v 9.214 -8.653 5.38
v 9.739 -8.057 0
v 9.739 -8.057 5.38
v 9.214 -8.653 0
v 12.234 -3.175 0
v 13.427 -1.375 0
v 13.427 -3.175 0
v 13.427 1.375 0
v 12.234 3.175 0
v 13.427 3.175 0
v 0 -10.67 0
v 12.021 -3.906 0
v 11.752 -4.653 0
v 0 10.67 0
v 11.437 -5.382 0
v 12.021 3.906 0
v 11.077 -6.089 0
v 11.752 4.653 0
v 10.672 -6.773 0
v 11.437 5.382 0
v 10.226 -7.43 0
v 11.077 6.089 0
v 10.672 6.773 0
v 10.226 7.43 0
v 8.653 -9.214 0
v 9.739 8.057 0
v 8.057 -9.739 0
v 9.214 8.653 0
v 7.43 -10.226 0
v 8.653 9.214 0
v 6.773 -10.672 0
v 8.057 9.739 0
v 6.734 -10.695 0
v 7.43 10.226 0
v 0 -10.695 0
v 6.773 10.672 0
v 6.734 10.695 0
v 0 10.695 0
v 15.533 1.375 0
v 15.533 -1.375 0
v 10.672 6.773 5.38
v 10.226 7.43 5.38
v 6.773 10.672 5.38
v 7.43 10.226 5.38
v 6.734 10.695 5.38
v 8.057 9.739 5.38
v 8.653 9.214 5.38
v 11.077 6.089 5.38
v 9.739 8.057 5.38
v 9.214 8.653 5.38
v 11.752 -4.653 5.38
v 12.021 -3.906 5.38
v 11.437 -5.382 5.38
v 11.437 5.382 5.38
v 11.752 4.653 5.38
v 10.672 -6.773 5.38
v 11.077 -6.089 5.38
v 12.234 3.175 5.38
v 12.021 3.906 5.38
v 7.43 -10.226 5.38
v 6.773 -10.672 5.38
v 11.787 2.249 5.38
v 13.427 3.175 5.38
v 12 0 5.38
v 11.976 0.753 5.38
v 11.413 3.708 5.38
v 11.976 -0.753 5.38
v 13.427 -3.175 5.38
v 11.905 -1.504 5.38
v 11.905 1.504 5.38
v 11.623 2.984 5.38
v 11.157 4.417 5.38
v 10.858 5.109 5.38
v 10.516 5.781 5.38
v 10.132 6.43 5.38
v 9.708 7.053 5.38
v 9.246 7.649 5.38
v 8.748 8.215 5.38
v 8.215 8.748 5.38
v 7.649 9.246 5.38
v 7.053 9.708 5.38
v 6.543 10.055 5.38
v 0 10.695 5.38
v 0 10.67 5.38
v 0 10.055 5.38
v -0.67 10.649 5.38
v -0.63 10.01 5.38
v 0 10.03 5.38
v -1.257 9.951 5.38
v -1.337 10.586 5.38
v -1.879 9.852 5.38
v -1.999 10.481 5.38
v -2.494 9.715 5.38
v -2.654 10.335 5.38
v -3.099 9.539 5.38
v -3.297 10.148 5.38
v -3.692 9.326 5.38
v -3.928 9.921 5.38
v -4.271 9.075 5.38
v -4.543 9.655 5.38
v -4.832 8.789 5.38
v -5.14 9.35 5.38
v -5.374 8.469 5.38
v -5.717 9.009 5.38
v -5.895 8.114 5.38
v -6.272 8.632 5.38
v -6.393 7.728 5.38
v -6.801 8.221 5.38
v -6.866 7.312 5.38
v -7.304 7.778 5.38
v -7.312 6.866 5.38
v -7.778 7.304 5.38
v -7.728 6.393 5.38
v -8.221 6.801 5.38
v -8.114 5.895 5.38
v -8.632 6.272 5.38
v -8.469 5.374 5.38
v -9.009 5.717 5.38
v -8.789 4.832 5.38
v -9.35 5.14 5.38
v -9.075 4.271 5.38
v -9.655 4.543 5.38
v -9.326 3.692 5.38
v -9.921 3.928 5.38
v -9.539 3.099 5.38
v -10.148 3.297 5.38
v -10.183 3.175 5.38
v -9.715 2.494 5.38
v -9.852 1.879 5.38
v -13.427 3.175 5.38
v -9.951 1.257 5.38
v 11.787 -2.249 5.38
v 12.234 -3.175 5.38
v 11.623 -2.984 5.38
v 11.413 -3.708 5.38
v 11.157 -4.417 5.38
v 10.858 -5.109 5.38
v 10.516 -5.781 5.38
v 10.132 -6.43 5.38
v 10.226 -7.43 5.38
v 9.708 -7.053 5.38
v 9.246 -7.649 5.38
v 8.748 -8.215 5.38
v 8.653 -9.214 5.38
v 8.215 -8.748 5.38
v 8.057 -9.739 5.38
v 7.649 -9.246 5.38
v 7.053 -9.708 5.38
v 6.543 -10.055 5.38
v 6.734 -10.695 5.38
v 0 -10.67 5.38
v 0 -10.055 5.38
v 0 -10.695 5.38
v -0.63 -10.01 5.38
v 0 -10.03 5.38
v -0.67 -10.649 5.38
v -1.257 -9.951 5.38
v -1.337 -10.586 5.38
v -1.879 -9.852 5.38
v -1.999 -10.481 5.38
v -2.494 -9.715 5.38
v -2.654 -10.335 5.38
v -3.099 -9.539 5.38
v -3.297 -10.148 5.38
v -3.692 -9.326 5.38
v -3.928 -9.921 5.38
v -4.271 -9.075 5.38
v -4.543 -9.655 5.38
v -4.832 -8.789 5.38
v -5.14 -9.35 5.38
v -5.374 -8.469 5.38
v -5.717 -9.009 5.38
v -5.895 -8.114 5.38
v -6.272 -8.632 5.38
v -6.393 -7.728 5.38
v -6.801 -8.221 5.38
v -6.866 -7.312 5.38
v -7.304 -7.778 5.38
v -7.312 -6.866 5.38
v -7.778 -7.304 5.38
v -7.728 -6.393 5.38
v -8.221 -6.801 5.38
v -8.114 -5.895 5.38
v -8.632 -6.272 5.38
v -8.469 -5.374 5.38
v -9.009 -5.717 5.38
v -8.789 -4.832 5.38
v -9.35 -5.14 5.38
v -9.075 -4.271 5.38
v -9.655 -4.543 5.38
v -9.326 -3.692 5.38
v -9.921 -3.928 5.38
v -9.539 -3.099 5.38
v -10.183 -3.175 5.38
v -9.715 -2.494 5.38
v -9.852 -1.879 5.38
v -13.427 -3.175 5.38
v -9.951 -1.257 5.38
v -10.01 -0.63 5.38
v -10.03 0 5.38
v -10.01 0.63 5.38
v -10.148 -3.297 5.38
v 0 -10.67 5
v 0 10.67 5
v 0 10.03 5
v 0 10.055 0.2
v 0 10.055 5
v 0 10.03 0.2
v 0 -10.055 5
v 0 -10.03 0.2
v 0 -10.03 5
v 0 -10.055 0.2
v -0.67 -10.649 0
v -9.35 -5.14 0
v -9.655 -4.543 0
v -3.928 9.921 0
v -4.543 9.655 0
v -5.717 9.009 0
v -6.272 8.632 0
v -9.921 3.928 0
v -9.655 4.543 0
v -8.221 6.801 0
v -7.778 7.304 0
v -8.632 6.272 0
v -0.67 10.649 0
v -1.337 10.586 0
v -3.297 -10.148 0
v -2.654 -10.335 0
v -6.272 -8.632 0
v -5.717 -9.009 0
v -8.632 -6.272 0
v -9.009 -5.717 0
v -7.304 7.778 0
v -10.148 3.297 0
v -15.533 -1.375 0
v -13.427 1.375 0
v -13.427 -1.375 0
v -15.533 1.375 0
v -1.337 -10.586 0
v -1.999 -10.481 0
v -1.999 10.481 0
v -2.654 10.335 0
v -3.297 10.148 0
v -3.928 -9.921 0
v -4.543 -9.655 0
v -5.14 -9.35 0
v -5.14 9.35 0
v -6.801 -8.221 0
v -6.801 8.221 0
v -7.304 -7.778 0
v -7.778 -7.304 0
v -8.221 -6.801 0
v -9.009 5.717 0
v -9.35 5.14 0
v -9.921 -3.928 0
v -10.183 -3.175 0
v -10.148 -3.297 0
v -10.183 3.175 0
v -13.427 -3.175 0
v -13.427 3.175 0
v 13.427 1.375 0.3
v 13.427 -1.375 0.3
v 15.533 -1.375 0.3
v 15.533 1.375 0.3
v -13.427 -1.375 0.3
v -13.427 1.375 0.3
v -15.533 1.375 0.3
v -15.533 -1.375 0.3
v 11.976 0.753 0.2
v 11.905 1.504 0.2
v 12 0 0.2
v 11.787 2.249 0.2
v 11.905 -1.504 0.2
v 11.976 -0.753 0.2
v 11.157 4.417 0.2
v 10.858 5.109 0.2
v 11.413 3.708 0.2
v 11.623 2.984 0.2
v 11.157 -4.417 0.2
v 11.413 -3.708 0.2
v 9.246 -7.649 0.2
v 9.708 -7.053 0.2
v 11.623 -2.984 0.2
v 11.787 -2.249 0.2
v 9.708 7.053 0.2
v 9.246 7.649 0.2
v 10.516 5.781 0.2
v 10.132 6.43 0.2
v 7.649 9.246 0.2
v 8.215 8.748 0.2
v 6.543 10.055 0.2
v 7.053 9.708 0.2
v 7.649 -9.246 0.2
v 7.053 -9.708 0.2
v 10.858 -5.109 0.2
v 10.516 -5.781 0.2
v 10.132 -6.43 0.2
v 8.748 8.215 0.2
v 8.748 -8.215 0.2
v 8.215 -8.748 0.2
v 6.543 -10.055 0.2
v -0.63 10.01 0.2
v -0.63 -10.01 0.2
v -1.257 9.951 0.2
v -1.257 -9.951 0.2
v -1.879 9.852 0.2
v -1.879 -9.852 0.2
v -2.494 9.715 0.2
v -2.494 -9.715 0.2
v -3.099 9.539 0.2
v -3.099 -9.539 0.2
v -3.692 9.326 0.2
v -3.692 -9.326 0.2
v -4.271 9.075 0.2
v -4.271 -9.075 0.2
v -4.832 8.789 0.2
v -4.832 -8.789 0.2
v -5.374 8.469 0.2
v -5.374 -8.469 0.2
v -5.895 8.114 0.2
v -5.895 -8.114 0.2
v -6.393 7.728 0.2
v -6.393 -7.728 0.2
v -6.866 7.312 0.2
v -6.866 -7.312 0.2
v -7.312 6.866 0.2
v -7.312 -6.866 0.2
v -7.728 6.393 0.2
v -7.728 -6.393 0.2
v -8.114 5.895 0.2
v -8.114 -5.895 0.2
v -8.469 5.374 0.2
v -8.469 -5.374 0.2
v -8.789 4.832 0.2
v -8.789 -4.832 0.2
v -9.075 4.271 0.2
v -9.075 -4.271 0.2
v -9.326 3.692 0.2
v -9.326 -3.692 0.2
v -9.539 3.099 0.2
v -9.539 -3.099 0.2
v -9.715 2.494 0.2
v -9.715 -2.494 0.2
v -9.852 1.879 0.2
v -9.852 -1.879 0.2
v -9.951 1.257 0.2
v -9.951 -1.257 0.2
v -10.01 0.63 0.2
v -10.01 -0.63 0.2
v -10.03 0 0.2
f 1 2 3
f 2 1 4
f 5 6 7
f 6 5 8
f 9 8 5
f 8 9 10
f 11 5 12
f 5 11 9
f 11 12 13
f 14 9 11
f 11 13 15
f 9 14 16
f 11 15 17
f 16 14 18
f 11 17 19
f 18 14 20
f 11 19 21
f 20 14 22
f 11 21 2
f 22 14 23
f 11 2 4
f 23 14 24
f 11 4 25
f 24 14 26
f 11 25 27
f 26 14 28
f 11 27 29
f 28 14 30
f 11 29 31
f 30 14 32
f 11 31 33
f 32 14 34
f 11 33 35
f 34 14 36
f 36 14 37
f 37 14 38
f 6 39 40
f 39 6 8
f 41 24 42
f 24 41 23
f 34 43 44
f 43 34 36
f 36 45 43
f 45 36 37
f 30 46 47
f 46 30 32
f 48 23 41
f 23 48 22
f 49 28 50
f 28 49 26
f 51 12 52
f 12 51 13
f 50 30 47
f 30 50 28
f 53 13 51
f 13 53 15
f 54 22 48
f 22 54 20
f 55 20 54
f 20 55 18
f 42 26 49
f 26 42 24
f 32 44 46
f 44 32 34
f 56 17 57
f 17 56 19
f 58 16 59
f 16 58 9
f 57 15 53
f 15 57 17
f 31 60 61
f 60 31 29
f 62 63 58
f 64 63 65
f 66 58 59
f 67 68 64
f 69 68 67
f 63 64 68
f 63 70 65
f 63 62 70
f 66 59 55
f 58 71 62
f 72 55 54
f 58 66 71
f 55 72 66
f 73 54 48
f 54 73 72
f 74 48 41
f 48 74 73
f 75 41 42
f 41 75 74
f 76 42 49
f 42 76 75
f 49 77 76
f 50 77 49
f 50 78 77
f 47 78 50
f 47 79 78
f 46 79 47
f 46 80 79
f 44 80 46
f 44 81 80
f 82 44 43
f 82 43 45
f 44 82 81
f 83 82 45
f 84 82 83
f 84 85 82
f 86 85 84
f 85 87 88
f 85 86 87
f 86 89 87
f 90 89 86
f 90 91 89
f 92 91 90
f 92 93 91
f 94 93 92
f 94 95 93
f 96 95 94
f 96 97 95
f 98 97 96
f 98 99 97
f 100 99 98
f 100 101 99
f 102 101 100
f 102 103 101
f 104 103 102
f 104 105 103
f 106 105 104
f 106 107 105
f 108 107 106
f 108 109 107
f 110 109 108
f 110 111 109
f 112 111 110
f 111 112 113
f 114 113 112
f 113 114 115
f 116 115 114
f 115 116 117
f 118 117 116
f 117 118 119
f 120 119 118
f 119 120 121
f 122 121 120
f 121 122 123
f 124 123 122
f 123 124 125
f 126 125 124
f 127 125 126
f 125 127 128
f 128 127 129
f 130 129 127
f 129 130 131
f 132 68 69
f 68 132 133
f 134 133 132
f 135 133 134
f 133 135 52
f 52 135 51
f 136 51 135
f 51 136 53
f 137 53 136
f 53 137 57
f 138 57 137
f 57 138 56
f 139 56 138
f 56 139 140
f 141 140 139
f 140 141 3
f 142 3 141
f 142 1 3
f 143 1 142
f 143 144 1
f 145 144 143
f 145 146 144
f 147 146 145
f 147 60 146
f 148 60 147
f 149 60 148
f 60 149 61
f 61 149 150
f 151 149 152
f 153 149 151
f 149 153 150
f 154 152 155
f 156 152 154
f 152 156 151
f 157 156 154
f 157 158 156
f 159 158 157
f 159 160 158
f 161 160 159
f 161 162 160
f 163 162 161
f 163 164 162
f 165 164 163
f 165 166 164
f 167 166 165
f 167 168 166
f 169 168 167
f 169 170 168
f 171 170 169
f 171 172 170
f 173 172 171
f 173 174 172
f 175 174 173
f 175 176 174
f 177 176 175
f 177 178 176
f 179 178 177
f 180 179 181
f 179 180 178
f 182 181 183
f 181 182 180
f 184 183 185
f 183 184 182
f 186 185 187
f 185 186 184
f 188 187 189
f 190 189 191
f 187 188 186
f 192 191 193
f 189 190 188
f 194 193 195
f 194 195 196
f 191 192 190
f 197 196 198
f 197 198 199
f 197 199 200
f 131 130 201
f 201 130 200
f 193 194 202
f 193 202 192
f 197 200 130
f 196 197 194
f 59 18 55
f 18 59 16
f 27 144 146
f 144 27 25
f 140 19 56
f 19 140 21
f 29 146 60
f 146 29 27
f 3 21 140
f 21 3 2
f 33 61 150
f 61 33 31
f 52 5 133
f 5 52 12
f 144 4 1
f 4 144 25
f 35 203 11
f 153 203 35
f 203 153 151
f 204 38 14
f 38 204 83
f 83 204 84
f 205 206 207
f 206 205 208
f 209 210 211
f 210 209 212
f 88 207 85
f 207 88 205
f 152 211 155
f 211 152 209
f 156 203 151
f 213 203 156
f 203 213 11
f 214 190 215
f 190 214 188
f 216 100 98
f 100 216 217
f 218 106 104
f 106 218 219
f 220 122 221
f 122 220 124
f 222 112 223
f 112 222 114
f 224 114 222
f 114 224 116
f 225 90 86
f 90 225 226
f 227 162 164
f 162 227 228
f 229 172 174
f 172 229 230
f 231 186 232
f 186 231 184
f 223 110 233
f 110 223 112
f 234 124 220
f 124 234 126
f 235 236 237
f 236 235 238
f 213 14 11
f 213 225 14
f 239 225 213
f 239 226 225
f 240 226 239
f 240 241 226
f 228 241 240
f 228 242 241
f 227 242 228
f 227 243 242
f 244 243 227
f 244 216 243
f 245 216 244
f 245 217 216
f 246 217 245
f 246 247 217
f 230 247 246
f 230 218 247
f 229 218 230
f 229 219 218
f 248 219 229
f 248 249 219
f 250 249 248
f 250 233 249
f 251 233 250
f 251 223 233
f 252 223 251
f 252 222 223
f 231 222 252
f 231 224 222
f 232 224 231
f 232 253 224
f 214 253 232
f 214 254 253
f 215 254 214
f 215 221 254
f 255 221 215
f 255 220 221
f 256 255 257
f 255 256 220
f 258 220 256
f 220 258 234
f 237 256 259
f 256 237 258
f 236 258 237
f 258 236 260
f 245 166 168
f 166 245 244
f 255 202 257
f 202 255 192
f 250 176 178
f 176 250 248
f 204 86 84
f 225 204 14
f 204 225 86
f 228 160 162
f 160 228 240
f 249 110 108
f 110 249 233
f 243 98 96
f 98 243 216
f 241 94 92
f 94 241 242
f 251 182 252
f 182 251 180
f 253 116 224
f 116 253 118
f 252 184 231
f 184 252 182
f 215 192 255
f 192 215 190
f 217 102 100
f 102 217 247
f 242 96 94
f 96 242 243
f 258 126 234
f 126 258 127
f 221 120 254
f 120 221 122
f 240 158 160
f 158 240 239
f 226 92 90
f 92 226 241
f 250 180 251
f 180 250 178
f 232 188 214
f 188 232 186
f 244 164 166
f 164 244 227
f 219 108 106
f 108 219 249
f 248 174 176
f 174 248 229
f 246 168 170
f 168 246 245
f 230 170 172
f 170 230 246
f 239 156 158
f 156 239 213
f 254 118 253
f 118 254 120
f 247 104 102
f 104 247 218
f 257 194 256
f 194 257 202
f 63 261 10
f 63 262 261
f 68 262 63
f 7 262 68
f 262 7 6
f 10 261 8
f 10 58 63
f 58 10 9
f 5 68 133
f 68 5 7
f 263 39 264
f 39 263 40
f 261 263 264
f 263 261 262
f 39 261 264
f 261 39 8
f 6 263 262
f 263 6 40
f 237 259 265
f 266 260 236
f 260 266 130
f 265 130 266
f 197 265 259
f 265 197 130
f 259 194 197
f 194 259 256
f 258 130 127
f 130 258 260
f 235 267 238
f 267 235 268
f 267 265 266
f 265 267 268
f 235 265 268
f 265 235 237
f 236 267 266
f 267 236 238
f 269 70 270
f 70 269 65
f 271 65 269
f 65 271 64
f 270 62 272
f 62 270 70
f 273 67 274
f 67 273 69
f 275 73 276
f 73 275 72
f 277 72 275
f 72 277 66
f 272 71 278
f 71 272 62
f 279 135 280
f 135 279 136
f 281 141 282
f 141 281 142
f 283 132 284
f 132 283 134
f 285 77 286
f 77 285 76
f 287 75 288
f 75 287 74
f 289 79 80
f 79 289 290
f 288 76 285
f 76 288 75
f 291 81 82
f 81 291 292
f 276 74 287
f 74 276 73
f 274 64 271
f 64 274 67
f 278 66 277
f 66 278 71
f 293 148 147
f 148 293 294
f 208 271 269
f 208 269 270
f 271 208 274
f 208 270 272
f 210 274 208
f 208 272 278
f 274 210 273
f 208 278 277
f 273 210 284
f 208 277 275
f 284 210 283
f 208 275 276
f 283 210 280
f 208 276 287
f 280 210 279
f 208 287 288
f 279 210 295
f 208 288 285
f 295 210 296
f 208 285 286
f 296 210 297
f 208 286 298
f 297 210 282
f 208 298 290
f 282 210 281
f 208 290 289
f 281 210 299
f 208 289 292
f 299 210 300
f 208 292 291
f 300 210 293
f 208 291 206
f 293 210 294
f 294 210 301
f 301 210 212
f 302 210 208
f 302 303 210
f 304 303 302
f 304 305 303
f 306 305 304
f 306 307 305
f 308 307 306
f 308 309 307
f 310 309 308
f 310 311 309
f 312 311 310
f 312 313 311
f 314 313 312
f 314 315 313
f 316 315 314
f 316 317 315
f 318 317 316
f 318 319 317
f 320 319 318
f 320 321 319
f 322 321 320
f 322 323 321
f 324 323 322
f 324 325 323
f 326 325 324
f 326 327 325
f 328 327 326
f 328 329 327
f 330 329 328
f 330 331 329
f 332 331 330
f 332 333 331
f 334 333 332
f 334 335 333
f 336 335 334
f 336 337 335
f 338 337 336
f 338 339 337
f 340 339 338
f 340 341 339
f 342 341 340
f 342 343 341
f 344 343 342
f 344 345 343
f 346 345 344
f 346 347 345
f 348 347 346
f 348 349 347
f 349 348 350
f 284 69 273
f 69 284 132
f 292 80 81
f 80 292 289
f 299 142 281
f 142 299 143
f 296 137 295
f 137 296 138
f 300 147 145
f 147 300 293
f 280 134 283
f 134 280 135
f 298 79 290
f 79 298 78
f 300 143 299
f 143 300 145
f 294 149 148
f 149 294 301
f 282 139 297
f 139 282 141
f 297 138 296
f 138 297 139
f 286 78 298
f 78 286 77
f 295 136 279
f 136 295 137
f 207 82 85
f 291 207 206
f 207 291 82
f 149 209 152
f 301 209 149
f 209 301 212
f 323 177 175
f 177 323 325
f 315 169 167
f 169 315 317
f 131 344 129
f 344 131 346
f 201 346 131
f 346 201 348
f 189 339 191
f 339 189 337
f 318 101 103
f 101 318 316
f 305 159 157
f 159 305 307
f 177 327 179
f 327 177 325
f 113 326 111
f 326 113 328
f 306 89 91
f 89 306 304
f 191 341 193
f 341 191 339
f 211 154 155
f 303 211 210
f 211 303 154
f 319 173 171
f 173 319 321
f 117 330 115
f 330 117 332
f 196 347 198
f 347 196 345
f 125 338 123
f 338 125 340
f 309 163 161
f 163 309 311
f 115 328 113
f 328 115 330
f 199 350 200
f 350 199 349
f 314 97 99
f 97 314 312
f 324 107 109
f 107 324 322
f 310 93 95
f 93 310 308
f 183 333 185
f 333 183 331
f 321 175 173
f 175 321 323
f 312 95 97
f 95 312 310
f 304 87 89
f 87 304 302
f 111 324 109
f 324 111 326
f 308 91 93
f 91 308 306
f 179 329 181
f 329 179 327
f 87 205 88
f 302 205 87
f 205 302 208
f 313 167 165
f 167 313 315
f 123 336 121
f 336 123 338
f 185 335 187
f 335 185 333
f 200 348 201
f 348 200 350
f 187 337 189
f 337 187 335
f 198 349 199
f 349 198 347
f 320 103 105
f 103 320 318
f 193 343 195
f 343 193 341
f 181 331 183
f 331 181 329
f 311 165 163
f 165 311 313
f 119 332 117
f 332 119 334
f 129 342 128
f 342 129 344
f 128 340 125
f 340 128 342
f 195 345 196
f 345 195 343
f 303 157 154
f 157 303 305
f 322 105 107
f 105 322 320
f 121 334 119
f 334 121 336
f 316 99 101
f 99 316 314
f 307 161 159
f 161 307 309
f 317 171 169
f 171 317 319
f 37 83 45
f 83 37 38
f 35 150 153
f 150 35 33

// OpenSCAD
/*
 * Creates the Memory Protecton Devices CR2032 Battery holder.
 *
 * Author: Ian McInerney
 * Created: June 22, 2013
 */

// The pin holder on either end
module pinHolder() {
	translate([1.905,0,2.69])cube(size=[3.81,6.35,5.38], center=true);
	translate([4.8625,0.0,0.15])cube(size=[2.105,2.75,0.3], center=true);
}

// Create the hollow area inside for the battery
module internalCutout() {
	// The cutout for the positive terminal area
	difference() {
		// The main cylinder
		translate([0.0,0.0,0.2])cylinder(h=6.0,r=12.0, center=false, $fn=100);
		// Cut off the cylinder at the Y-Axis
		translate([-6.0,0.0,0.0])cube(size=[12.0,100.0,100.0], center=true);
		// Cut off the cylinder at the maximum Y extents
		translate([0.0,15.4025,0])cube(size=[34.0,10.695,12.64], center=true);

		translate([0.0,-15.4025,0])cube(size=[34.0,10.695,12.64], center=true);	
	}

	// The cutout for the negative terminal area
	difference() {
		// The main cylinder
		translate([0.0,0.0,0.2])cylinder(h=6.0,r=10.03, center=false, $fn=100);
		// Cut off the cylinder at the Y-Axis
		translate([6.1,0.0,0.0])cube(size=[12.0,100.0,100.0], center=true);
	}
}

// The outside cylinders
module baseDesign() {
	difference() {
		cylinder(h=5.38,r=12.64, center=false, $fn=100);
		translate([-6.32,0.0,0.0])cube(size=[12.64,100.0,100.0], center=true);
	}
	difference() {
		cylinder(h=5.38,r=10.67, center=false, $fn=100);
		translate([5.335,0.0,0.0])cube(size=[10.67,22.0,10.0], center=true);
	}

	// The negative terminal
	rotate(a=[0,0,180])translate([9.6175,0,0])pinHolder();

	// The positive terminal
	translate([9.6175,0,0])pinHolder();
}



// Create the holder
difference() {
	baseDesign();
	internalCutout();

	// The cube to represent the maximum positive Y extent
	translate([0.0,16.0425,0])cube(size=[34.0,10.695,12.64], center=true);

	// The cube to represent the maximum negative Y extent
	translate([0.0,-16.0425,0])cube(size=[34.0,10.695,12.64], center=true);	
}
